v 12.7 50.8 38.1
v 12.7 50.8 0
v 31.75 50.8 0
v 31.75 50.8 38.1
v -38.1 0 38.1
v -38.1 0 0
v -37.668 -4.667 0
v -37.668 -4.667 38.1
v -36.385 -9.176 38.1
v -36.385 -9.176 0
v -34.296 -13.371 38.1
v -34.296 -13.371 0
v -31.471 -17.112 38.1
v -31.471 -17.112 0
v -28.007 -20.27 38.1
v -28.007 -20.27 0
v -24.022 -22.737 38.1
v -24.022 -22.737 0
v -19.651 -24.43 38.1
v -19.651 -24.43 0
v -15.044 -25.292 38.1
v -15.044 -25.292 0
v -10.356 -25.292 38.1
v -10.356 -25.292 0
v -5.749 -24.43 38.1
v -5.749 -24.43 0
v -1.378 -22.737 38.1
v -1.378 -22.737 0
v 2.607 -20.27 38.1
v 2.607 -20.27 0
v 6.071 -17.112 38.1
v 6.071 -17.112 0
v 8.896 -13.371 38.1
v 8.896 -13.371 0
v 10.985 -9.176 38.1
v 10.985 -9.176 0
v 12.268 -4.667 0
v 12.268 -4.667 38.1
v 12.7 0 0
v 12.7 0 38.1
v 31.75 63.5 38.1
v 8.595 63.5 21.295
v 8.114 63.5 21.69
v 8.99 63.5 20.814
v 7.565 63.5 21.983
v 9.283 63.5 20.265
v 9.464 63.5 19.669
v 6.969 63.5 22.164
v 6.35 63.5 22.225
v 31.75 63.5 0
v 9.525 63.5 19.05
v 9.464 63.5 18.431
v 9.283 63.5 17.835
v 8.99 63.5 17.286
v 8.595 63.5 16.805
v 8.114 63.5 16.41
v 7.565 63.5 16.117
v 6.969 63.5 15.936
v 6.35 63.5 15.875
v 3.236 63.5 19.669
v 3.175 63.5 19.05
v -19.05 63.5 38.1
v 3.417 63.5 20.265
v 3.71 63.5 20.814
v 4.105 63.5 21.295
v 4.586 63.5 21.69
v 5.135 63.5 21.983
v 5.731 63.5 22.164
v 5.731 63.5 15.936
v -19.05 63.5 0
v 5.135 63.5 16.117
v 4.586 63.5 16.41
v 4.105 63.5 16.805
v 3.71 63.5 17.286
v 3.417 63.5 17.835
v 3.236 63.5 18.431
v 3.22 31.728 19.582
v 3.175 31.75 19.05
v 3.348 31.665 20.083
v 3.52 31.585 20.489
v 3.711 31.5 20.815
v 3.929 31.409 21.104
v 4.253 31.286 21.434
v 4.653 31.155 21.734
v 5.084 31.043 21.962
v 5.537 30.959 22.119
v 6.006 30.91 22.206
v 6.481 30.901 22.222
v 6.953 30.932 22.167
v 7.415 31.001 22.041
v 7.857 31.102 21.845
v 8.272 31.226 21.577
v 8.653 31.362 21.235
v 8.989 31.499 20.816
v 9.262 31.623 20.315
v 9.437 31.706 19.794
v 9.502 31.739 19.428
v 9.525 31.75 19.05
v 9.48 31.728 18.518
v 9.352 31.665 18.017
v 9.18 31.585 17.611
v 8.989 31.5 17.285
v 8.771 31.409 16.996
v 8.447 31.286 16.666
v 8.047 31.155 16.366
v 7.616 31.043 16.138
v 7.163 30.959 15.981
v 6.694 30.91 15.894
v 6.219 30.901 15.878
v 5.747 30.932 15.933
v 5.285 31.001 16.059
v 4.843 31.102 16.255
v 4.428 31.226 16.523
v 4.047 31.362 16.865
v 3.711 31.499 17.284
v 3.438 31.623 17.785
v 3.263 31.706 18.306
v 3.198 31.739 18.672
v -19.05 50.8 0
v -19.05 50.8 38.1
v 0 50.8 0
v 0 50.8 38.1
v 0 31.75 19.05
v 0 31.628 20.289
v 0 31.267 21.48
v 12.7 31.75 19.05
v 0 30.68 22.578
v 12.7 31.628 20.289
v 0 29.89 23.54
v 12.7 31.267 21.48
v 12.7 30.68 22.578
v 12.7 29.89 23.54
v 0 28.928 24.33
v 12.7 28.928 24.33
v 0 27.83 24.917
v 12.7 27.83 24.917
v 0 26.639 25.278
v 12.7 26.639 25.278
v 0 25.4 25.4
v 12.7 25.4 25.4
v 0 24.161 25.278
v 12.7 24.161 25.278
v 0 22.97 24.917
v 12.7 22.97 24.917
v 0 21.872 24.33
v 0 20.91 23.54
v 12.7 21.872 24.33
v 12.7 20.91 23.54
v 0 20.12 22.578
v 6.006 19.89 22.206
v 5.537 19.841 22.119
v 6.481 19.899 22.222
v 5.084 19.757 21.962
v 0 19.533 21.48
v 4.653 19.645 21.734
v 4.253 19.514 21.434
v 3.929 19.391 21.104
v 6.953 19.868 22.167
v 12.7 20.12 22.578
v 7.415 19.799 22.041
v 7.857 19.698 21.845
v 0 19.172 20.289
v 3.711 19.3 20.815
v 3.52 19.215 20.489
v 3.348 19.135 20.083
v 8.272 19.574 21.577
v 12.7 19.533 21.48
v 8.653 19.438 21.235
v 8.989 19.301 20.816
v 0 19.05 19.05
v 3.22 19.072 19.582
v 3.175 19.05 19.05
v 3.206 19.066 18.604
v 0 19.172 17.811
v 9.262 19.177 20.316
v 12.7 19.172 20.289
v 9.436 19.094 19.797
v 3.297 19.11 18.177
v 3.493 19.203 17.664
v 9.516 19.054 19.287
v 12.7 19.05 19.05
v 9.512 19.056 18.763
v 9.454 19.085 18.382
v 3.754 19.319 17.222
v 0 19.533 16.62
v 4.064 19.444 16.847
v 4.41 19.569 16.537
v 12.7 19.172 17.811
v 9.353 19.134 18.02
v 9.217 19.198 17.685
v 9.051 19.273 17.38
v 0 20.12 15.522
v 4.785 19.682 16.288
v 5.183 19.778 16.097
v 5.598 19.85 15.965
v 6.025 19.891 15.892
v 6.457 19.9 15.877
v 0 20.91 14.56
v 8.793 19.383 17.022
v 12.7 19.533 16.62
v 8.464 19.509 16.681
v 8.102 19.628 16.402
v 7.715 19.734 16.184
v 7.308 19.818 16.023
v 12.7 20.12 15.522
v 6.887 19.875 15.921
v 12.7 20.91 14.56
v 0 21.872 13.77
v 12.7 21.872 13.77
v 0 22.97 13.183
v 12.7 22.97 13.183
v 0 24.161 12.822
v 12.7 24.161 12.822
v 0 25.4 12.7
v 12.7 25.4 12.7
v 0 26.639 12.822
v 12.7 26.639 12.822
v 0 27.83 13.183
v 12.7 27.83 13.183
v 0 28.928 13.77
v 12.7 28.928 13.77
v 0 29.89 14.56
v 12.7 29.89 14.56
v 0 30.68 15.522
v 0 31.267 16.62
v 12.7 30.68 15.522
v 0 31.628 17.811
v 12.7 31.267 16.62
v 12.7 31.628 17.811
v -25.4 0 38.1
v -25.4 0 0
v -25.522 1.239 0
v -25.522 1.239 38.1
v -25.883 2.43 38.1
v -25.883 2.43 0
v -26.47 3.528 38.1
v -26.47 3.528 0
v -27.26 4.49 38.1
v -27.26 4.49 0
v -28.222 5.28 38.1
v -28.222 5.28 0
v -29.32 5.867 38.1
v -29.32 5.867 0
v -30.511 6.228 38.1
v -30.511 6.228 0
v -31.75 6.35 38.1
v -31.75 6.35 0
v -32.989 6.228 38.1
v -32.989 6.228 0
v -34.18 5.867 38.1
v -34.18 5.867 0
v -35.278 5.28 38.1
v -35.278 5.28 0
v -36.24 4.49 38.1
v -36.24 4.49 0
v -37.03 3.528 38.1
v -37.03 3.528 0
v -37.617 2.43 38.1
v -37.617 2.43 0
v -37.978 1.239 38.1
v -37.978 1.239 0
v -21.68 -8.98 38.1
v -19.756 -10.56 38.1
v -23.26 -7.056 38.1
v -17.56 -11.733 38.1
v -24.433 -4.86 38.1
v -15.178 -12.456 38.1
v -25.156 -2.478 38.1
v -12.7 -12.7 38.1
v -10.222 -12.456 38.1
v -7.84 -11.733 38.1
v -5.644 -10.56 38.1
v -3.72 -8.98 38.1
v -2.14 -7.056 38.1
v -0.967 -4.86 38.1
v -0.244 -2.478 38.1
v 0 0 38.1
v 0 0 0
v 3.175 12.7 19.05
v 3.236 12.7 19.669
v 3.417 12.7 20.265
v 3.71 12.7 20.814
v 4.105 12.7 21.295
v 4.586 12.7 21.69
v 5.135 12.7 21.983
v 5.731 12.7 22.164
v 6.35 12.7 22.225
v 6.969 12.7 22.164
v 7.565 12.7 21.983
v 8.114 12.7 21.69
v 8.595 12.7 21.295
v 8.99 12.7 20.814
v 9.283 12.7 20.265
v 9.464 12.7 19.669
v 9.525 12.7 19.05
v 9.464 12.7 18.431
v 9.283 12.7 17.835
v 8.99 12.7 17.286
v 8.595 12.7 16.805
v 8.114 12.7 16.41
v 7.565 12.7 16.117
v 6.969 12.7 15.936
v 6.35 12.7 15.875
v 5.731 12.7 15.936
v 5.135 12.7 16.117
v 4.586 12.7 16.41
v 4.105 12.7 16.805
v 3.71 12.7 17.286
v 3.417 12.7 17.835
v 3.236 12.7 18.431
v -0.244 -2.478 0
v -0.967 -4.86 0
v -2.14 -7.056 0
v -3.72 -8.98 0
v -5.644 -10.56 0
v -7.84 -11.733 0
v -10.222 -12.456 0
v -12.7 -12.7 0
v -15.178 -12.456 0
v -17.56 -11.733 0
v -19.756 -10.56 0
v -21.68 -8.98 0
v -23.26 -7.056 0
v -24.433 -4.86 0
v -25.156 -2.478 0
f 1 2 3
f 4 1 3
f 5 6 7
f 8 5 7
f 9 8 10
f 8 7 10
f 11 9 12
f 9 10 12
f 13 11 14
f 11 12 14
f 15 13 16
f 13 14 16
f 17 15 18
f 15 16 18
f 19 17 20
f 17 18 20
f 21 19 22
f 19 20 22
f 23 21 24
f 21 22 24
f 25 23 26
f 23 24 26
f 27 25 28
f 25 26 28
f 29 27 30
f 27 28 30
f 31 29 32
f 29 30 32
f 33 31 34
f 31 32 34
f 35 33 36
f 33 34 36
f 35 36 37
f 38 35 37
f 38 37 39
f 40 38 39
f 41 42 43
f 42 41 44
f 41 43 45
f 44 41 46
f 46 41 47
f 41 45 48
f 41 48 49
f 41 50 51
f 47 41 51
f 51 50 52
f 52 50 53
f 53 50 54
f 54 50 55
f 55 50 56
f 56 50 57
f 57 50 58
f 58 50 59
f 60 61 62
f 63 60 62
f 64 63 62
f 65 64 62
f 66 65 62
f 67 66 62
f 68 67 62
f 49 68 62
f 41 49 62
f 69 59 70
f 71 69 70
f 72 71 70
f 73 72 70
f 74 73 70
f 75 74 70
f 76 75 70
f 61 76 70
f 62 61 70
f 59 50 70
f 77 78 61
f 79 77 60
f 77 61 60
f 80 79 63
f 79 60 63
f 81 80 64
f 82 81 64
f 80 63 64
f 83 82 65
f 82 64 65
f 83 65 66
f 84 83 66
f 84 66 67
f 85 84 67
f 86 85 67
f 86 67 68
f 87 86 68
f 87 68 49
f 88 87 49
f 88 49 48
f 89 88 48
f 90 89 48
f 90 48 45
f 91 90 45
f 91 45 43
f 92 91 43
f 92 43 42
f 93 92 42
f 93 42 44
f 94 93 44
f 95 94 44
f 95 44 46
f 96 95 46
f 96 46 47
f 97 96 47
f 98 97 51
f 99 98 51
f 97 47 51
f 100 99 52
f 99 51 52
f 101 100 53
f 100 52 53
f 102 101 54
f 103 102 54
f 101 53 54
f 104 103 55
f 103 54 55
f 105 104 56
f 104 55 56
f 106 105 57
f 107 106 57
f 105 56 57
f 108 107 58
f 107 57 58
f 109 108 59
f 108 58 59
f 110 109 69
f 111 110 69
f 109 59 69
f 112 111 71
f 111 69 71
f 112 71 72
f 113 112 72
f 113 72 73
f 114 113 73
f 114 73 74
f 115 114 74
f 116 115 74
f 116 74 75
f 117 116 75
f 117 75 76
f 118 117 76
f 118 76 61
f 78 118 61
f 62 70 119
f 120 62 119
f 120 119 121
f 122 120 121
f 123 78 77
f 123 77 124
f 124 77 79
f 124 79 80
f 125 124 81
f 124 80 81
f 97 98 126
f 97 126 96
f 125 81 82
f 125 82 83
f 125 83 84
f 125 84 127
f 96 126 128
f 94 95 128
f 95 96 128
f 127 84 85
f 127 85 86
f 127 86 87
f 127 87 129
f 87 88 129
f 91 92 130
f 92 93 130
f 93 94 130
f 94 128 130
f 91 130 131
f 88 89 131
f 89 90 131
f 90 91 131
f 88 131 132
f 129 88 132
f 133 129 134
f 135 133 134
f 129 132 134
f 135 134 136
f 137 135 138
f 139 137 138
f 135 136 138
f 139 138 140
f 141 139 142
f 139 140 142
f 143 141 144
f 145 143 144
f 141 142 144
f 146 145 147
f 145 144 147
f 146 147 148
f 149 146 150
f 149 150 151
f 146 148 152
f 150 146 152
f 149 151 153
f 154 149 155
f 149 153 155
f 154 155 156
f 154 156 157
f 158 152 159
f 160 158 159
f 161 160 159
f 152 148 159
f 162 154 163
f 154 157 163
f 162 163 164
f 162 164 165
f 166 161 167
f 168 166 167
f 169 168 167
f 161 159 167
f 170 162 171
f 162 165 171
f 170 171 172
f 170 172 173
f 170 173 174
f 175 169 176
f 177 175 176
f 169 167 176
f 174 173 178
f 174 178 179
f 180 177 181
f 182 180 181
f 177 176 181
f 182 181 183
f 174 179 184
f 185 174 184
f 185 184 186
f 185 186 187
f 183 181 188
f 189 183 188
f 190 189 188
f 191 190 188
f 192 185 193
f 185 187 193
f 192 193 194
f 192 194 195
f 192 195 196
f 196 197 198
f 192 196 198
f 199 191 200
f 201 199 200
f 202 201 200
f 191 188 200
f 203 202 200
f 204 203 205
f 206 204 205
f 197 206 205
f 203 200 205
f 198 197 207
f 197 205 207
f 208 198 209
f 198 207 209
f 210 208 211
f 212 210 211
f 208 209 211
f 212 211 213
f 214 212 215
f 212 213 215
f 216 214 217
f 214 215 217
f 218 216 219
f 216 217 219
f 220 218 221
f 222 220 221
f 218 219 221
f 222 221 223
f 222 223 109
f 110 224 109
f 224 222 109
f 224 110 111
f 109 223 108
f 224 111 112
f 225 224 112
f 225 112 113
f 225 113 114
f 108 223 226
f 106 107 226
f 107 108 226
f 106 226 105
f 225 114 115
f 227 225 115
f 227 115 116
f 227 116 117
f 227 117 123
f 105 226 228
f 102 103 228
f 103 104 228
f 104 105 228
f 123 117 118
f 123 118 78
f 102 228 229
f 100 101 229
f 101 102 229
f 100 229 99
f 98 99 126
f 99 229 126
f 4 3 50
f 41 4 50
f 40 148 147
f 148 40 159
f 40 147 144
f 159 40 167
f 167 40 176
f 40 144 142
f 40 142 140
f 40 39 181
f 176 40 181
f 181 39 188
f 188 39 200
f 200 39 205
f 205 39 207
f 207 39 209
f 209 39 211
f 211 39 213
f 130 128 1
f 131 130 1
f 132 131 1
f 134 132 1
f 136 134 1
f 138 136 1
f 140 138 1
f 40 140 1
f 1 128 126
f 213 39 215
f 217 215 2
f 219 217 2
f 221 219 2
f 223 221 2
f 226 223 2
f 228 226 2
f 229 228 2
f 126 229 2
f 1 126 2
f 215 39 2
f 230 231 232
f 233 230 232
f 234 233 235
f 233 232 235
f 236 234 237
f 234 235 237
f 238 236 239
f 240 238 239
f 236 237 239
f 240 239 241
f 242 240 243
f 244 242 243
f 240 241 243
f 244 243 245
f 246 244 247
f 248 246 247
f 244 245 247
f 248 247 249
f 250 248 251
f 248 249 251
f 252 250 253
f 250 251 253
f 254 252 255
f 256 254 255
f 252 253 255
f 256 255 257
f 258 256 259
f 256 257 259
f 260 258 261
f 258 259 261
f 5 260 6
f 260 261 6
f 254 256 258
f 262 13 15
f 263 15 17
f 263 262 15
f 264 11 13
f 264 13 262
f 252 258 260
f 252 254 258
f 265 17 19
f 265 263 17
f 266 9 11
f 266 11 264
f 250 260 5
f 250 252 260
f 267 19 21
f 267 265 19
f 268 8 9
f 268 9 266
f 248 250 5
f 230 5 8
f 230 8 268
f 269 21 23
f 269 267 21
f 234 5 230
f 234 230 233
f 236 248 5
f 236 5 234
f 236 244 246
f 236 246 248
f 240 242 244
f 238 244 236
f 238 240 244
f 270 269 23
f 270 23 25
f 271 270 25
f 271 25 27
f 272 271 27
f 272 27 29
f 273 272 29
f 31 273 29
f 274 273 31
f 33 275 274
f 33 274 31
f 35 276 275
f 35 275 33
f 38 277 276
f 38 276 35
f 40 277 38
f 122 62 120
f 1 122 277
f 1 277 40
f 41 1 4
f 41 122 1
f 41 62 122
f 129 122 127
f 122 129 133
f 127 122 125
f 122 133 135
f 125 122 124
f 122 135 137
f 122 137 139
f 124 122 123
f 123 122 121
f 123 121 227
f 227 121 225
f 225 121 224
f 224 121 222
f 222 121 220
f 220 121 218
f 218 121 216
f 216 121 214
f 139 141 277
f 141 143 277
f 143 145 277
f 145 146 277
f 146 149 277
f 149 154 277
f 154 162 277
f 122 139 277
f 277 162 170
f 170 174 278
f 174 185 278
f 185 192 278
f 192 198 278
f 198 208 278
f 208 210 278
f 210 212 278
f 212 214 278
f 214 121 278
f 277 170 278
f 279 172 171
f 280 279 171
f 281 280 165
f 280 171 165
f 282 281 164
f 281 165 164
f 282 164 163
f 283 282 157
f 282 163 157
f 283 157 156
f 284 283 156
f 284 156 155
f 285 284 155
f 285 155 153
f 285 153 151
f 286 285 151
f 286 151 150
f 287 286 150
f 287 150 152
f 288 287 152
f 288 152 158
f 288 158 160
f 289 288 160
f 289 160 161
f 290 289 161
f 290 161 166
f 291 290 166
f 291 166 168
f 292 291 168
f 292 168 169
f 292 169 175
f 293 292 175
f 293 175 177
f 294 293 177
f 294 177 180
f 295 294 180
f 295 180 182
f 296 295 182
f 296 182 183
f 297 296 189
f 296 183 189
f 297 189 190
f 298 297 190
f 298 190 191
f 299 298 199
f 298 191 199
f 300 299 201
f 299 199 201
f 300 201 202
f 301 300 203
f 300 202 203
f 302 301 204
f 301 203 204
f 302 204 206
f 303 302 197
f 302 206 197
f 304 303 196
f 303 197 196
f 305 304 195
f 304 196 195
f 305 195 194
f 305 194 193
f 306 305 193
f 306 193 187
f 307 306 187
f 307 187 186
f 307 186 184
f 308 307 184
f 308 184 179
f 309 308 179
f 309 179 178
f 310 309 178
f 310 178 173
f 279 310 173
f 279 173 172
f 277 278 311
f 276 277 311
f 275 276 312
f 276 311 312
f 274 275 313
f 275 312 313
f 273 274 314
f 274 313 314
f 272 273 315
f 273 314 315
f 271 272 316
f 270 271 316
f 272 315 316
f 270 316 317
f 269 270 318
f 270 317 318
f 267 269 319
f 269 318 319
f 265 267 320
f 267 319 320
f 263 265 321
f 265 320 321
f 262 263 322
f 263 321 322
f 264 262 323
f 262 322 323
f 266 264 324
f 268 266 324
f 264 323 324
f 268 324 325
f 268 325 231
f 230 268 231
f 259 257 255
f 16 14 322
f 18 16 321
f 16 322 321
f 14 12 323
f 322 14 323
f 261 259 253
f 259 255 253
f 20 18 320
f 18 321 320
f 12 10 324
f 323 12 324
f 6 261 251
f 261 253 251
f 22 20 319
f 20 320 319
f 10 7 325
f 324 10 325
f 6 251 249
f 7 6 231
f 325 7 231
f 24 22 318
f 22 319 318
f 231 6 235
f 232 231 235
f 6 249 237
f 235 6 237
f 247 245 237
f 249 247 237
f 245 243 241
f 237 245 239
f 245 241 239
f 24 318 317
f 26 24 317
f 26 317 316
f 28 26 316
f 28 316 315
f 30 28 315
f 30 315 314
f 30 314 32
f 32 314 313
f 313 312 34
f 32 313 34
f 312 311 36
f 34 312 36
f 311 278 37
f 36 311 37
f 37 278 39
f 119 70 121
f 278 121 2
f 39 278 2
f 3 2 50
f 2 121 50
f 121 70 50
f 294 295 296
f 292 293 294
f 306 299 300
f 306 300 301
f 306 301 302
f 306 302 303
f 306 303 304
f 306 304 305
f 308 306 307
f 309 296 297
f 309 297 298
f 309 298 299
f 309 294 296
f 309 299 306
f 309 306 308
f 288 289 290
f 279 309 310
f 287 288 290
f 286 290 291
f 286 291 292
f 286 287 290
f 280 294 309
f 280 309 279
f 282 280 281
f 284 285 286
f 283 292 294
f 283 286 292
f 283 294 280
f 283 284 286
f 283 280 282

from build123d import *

# Parameters (mm, degrees)
F1_DEPTH = 38.1
F2_R     = 6.35
F3_DEPTH = 50.801
F4_R     = 3.175
F5_DEPTH = 50.8


with BuildPart() as f1:
    # F0 (on Top) → F1 (new body)
    with BuildSketch(Plane.XY):
        Polygon((0, 50.8), (0, 0), (12.7, 0), (12.7, 50.8), (6.35, 50.8), align=None)
        with BuildLine():
            Line((12.7, 0), (0, 0))
            ThreePointArc((0, 0), (-12.7, -12.7), (-25.4, 0))
            ThreePointArc((-25.4, 0), (-31.75, 6.35), (-38.1, 0))
            ThreePointArc((-38.1, 0), (-12.7, -25.4), (12.7, 0))
        make_face()
        Polygon((-19.05, 50.8), (0, 50.8), (6.35, 50.8), (6.35, 63.5), (-19.05, 63.5), align=None)
        Polygon((6.35, 50.8), (12.7, 50.8), (31.75, 50.8), (31.75, 63.5), (6.35, 63.5), align=None)
    extrude(amount=F1_DEPTH)

    # F2 (on face) → F3 (cut, through all)
    with BuildSketch(Plane.YZ.offset(12.7)):
        with Locations((25.4, 19.05)):
            Circle(F2_R)
    extrude(amount=-F3_DEPTH, mode=Mode.SUBTRACT)

    # F4 (on face) → F5 (cut)
    with BuildSketch(Plane(origin=(0, 63.5, 0), x_dir=(-1, 0, 0), z_dir=(0, 1, 0))):
        with Locations((-6.35, 19.05)):
            Circle(F4_R)
    extrude(amount=-F5_DEPTH, mode=Mode.SUBTRACT)


solid = f1.part
